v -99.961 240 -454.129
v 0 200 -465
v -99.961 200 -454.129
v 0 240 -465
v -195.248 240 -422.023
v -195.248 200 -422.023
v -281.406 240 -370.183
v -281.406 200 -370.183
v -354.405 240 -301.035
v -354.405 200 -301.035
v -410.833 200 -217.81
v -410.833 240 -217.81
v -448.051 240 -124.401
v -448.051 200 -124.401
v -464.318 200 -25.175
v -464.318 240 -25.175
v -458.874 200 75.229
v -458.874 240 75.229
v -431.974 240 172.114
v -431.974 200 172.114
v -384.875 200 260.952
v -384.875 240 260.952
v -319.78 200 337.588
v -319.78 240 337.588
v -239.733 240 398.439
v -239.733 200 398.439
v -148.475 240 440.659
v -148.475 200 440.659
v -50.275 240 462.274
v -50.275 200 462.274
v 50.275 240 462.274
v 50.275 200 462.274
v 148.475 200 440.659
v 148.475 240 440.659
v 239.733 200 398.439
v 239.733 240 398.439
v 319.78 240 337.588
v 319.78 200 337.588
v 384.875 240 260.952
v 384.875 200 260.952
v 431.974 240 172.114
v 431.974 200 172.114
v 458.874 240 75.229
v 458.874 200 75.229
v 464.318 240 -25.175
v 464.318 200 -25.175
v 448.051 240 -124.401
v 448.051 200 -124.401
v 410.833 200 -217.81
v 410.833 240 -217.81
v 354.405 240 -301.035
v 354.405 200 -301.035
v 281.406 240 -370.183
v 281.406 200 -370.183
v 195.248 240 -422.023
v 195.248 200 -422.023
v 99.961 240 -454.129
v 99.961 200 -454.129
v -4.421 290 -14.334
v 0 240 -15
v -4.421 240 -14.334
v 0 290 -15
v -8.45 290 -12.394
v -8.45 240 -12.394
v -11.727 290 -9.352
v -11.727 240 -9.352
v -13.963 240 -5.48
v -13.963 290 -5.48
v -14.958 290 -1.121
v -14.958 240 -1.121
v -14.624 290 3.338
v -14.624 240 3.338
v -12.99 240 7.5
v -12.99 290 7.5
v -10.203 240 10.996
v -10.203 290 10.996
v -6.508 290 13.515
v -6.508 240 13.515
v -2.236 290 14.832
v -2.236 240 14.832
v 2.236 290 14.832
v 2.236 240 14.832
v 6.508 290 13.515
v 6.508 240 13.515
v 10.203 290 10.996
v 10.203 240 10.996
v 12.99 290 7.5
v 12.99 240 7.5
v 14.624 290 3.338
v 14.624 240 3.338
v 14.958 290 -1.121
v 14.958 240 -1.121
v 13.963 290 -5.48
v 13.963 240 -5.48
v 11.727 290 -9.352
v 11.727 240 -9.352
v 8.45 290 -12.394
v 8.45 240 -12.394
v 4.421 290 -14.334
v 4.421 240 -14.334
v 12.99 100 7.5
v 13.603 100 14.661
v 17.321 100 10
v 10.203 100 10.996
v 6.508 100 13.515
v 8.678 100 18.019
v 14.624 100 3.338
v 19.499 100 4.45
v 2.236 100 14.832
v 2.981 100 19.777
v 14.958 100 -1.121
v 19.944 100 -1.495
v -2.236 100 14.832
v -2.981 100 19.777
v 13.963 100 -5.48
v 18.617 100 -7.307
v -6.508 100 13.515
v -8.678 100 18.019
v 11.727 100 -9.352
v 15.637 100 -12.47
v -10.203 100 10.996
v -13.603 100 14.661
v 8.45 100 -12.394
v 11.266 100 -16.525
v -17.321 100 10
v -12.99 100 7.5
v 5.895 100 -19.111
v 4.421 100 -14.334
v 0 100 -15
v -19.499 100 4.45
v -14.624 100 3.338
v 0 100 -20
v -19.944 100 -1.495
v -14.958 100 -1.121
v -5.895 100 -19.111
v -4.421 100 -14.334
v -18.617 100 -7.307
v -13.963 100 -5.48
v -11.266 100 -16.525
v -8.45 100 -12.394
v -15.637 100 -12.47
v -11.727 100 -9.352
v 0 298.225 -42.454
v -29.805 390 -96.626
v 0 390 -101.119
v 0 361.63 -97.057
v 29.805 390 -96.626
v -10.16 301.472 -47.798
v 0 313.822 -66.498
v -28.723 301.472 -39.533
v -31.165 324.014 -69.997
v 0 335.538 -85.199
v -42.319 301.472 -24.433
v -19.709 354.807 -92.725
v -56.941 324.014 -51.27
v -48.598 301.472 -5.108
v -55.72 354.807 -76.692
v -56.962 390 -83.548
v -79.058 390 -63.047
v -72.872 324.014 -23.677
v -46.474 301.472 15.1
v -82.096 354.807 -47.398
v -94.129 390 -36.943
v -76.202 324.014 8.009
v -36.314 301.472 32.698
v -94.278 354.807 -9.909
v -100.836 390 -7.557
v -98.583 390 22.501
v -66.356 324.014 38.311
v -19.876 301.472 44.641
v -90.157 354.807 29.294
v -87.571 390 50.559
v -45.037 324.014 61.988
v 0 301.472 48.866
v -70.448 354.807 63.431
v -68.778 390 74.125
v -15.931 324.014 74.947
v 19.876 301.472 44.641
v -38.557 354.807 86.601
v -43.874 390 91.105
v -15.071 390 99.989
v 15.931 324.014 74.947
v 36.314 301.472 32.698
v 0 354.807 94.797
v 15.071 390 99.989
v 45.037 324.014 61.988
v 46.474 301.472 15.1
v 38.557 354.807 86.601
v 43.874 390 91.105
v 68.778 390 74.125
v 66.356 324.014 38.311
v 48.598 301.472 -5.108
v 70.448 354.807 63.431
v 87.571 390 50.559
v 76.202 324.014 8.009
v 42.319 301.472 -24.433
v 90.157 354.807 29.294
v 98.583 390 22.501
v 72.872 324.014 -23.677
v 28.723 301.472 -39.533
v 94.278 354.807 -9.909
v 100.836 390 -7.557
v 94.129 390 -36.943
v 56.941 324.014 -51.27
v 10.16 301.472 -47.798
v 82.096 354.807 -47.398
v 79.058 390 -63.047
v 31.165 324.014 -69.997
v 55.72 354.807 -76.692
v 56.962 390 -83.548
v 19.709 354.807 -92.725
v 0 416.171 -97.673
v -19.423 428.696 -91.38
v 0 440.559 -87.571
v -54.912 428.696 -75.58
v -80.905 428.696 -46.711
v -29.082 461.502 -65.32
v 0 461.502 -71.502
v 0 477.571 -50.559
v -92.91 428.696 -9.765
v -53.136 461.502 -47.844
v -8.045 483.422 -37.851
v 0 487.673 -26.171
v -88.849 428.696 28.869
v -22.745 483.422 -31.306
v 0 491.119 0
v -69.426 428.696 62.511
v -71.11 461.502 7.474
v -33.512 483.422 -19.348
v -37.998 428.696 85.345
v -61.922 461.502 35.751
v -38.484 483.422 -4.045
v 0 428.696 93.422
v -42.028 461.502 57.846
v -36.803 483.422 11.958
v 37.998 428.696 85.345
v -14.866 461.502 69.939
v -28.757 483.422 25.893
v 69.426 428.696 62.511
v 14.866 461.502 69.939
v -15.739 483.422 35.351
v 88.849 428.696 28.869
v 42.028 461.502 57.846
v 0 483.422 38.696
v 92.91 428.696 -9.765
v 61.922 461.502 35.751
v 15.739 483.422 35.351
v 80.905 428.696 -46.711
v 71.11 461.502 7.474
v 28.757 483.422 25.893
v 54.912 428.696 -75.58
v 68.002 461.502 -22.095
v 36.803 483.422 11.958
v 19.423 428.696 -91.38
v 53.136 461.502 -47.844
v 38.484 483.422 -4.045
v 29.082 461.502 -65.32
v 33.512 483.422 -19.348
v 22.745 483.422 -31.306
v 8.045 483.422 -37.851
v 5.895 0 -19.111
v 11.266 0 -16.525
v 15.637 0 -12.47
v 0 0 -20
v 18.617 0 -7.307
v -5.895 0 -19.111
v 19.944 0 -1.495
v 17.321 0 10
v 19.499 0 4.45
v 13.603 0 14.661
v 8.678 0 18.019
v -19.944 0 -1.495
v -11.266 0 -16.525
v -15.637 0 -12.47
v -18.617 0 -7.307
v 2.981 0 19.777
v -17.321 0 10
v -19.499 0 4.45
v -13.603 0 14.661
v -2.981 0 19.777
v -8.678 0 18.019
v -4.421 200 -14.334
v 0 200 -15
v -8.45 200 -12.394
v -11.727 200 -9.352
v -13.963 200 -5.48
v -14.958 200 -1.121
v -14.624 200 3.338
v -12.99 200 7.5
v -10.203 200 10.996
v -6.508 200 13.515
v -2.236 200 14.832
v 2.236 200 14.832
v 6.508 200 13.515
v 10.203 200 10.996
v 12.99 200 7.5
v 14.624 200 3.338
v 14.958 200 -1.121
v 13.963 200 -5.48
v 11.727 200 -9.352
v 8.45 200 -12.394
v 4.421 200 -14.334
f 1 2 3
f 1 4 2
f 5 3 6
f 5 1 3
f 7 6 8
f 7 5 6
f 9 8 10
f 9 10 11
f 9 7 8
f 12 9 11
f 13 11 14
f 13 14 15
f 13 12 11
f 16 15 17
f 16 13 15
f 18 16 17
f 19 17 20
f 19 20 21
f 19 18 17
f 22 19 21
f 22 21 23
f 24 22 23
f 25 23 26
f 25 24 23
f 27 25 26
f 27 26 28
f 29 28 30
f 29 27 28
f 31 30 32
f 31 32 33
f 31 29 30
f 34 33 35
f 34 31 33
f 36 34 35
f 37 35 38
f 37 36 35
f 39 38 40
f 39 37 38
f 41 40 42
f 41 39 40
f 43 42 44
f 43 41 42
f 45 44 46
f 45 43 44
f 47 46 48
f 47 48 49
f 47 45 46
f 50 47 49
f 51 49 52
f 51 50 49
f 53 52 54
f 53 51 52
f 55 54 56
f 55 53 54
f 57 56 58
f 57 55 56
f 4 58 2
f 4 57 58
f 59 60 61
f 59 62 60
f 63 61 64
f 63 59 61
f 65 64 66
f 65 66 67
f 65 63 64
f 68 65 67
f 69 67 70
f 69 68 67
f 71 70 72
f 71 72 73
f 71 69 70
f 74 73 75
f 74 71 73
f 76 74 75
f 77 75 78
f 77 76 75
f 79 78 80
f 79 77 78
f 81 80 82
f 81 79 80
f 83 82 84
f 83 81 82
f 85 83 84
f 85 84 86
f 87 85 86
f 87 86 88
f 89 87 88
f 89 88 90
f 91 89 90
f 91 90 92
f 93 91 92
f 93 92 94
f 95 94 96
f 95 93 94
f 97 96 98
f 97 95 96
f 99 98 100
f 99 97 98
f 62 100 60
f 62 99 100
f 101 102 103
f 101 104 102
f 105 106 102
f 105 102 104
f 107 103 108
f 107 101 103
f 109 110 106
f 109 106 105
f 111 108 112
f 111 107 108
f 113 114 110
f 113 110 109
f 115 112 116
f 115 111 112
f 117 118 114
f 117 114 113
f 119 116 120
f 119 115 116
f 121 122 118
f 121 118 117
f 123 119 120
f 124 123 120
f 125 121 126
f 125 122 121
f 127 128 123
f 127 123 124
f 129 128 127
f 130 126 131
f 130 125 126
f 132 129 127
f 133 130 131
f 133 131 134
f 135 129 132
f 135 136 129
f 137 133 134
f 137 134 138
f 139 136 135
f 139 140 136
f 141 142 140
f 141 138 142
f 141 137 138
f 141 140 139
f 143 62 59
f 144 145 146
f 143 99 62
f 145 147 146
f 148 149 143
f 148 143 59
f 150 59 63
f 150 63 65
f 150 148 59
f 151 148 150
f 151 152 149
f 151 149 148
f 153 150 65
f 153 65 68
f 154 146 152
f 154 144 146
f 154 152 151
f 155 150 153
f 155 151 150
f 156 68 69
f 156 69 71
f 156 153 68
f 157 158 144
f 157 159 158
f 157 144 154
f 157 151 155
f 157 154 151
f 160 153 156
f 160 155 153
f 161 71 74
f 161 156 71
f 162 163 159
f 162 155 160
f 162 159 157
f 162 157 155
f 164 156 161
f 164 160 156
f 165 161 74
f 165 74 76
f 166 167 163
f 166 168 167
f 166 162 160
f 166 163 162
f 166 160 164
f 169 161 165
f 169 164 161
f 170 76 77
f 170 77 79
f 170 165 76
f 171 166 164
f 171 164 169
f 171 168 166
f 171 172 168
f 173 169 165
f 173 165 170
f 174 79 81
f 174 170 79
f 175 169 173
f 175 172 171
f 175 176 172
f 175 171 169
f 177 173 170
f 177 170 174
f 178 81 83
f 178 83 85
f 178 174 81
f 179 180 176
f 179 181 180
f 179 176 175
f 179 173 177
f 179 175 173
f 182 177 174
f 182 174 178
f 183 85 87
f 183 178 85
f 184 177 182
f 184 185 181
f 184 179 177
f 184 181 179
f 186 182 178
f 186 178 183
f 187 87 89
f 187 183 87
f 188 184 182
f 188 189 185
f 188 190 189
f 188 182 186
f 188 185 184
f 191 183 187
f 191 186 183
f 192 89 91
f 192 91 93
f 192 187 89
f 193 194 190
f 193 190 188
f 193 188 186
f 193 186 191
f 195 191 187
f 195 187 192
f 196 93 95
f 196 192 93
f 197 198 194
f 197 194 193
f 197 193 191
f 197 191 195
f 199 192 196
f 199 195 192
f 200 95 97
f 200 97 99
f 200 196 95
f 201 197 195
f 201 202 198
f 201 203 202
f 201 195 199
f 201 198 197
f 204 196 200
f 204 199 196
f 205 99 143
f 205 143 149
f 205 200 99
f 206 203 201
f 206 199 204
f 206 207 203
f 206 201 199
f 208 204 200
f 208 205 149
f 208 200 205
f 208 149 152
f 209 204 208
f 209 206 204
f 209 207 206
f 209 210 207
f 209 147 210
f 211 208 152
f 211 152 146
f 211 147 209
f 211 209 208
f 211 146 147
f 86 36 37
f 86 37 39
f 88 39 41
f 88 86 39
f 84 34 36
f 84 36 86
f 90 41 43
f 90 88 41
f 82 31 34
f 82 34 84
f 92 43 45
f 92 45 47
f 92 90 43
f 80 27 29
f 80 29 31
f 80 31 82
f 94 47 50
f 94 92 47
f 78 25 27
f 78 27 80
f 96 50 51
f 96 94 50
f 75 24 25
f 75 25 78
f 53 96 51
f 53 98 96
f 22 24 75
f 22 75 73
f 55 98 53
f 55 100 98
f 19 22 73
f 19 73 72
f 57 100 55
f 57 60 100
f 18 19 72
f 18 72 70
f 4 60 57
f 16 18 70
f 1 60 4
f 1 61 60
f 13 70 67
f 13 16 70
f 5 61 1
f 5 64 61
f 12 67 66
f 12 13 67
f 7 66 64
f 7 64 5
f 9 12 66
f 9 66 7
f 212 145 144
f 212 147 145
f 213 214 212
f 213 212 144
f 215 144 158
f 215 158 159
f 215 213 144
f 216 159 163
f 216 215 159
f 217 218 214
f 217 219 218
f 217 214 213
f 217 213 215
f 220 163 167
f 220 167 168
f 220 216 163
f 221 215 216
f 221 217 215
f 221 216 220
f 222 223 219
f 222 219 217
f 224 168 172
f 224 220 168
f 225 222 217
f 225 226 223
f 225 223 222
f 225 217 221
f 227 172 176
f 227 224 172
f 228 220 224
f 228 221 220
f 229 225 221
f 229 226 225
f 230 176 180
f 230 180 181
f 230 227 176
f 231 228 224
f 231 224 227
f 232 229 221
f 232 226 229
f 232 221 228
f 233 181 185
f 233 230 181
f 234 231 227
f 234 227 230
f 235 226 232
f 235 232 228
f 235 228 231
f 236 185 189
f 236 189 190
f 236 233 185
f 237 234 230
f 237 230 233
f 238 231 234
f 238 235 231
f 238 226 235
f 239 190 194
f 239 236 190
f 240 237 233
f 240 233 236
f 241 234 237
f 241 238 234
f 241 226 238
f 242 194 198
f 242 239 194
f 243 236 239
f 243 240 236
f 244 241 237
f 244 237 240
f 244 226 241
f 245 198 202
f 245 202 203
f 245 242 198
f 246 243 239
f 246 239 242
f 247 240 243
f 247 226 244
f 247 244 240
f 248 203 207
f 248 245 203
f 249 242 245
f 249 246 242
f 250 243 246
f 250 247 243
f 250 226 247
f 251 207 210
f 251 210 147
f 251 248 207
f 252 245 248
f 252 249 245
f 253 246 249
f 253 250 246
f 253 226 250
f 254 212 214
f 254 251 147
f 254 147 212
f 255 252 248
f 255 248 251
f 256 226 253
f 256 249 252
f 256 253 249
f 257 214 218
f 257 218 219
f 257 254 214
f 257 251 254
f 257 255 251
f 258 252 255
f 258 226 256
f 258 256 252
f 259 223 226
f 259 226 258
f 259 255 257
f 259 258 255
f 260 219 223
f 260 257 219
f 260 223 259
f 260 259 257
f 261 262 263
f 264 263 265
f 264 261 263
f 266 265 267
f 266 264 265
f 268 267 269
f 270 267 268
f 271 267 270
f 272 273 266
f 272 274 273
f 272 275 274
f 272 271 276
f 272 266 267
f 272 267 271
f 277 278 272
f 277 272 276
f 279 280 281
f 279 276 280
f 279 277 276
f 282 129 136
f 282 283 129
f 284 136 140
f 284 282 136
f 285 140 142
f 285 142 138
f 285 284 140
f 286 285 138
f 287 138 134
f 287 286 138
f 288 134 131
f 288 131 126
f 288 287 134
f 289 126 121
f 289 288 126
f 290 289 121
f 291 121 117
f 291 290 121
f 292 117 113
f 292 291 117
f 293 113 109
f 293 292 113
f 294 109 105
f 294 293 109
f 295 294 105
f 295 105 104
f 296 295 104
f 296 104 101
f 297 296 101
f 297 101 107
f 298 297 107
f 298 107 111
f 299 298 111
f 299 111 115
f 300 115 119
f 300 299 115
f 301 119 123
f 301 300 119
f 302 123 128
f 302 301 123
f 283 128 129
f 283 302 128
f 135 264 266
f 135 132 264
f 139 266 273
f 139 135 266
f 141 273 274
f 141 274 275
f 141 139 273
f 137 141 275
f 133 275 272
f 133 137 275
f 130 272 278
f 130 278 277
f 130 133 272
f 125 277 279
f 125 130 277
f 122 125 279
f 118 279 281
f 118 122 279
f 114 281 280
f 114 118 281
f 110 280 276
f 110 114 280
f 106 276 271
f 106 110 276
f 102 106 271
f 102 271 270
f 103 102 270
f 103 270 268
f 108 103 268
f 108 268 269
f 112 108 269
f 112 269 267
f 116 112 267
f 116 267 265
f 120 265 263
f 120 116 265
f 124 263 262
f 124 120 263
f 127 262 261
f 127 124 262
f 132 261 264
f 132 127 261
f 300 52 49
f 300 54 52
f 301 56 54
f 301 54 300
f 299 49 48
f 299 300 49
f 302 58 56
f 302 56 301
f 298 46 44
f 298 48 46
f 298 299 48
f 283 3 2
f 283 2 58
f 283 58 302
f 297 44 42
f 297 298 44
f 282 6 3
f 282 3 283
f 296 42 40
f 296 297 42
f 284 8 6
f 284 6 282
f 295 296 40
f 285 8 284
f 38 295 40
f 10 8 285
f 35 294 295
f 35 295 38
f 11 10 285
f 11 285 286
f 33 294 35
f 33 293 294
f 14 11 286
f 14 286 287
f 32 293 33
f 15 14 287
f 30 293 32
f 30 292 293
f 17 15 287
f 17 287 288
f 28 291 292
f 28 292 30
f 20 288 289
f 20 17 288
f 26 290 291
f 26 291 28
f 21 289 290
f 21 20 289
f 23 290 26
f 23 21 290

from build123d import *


with BuildPart() as part:
    # 草图1 → 旋转1 (revolve)
    with BuildSketch(Plane.XY, mode=Mode.PRIVATE) as revolve_1_sk:
        with BuildLine():
            Line((0, 288.881257919), (0, 0))
            Line((0, 0), (20, 0))
            Line((20, 0), (20, 100))
            Line((20, 100), (15, 100))
            Line((15, 100), (15, 200))
            Line((15, 200), (465, 200))
            Line((465, 200), (465, 240))
            Line((465, 240), (15, 240))
            Line((15, 240), (15, 290))
            ThreePointArc((15, 290), (7.520830803, 289.161331306), (0, 288.881257919))
        make_face()
        with BuildLine():
            Line((0, 390), (0, 290))
            Line((0, 290), (15, 290))
            ThreePointArc((15, 290), (76.6217369, 324.014324021), (101.118742081, 390))
            ThreePointArc((101.118742081, 390), (71.50174823, 461.50174823), (0, 491.118742081))
            Line((0, 491.118742081), (0, 390))
        make_face()
        with BuildLine():
            Line((0, 290), (0, 288.881257919))
            ThreePointArc((0, 288.881257919), (7.520830803, 289.161331306), (15, 290))
            Line((15, 290), (0, 290))
        make_face()
    revolve(revolve_1_sk.sketch.rotate(Axis((0, 290, 0), (0, 1, 0)), 90), axis=Axis((0, 290, 0), (0, 1, 0)))


solid = part.part
